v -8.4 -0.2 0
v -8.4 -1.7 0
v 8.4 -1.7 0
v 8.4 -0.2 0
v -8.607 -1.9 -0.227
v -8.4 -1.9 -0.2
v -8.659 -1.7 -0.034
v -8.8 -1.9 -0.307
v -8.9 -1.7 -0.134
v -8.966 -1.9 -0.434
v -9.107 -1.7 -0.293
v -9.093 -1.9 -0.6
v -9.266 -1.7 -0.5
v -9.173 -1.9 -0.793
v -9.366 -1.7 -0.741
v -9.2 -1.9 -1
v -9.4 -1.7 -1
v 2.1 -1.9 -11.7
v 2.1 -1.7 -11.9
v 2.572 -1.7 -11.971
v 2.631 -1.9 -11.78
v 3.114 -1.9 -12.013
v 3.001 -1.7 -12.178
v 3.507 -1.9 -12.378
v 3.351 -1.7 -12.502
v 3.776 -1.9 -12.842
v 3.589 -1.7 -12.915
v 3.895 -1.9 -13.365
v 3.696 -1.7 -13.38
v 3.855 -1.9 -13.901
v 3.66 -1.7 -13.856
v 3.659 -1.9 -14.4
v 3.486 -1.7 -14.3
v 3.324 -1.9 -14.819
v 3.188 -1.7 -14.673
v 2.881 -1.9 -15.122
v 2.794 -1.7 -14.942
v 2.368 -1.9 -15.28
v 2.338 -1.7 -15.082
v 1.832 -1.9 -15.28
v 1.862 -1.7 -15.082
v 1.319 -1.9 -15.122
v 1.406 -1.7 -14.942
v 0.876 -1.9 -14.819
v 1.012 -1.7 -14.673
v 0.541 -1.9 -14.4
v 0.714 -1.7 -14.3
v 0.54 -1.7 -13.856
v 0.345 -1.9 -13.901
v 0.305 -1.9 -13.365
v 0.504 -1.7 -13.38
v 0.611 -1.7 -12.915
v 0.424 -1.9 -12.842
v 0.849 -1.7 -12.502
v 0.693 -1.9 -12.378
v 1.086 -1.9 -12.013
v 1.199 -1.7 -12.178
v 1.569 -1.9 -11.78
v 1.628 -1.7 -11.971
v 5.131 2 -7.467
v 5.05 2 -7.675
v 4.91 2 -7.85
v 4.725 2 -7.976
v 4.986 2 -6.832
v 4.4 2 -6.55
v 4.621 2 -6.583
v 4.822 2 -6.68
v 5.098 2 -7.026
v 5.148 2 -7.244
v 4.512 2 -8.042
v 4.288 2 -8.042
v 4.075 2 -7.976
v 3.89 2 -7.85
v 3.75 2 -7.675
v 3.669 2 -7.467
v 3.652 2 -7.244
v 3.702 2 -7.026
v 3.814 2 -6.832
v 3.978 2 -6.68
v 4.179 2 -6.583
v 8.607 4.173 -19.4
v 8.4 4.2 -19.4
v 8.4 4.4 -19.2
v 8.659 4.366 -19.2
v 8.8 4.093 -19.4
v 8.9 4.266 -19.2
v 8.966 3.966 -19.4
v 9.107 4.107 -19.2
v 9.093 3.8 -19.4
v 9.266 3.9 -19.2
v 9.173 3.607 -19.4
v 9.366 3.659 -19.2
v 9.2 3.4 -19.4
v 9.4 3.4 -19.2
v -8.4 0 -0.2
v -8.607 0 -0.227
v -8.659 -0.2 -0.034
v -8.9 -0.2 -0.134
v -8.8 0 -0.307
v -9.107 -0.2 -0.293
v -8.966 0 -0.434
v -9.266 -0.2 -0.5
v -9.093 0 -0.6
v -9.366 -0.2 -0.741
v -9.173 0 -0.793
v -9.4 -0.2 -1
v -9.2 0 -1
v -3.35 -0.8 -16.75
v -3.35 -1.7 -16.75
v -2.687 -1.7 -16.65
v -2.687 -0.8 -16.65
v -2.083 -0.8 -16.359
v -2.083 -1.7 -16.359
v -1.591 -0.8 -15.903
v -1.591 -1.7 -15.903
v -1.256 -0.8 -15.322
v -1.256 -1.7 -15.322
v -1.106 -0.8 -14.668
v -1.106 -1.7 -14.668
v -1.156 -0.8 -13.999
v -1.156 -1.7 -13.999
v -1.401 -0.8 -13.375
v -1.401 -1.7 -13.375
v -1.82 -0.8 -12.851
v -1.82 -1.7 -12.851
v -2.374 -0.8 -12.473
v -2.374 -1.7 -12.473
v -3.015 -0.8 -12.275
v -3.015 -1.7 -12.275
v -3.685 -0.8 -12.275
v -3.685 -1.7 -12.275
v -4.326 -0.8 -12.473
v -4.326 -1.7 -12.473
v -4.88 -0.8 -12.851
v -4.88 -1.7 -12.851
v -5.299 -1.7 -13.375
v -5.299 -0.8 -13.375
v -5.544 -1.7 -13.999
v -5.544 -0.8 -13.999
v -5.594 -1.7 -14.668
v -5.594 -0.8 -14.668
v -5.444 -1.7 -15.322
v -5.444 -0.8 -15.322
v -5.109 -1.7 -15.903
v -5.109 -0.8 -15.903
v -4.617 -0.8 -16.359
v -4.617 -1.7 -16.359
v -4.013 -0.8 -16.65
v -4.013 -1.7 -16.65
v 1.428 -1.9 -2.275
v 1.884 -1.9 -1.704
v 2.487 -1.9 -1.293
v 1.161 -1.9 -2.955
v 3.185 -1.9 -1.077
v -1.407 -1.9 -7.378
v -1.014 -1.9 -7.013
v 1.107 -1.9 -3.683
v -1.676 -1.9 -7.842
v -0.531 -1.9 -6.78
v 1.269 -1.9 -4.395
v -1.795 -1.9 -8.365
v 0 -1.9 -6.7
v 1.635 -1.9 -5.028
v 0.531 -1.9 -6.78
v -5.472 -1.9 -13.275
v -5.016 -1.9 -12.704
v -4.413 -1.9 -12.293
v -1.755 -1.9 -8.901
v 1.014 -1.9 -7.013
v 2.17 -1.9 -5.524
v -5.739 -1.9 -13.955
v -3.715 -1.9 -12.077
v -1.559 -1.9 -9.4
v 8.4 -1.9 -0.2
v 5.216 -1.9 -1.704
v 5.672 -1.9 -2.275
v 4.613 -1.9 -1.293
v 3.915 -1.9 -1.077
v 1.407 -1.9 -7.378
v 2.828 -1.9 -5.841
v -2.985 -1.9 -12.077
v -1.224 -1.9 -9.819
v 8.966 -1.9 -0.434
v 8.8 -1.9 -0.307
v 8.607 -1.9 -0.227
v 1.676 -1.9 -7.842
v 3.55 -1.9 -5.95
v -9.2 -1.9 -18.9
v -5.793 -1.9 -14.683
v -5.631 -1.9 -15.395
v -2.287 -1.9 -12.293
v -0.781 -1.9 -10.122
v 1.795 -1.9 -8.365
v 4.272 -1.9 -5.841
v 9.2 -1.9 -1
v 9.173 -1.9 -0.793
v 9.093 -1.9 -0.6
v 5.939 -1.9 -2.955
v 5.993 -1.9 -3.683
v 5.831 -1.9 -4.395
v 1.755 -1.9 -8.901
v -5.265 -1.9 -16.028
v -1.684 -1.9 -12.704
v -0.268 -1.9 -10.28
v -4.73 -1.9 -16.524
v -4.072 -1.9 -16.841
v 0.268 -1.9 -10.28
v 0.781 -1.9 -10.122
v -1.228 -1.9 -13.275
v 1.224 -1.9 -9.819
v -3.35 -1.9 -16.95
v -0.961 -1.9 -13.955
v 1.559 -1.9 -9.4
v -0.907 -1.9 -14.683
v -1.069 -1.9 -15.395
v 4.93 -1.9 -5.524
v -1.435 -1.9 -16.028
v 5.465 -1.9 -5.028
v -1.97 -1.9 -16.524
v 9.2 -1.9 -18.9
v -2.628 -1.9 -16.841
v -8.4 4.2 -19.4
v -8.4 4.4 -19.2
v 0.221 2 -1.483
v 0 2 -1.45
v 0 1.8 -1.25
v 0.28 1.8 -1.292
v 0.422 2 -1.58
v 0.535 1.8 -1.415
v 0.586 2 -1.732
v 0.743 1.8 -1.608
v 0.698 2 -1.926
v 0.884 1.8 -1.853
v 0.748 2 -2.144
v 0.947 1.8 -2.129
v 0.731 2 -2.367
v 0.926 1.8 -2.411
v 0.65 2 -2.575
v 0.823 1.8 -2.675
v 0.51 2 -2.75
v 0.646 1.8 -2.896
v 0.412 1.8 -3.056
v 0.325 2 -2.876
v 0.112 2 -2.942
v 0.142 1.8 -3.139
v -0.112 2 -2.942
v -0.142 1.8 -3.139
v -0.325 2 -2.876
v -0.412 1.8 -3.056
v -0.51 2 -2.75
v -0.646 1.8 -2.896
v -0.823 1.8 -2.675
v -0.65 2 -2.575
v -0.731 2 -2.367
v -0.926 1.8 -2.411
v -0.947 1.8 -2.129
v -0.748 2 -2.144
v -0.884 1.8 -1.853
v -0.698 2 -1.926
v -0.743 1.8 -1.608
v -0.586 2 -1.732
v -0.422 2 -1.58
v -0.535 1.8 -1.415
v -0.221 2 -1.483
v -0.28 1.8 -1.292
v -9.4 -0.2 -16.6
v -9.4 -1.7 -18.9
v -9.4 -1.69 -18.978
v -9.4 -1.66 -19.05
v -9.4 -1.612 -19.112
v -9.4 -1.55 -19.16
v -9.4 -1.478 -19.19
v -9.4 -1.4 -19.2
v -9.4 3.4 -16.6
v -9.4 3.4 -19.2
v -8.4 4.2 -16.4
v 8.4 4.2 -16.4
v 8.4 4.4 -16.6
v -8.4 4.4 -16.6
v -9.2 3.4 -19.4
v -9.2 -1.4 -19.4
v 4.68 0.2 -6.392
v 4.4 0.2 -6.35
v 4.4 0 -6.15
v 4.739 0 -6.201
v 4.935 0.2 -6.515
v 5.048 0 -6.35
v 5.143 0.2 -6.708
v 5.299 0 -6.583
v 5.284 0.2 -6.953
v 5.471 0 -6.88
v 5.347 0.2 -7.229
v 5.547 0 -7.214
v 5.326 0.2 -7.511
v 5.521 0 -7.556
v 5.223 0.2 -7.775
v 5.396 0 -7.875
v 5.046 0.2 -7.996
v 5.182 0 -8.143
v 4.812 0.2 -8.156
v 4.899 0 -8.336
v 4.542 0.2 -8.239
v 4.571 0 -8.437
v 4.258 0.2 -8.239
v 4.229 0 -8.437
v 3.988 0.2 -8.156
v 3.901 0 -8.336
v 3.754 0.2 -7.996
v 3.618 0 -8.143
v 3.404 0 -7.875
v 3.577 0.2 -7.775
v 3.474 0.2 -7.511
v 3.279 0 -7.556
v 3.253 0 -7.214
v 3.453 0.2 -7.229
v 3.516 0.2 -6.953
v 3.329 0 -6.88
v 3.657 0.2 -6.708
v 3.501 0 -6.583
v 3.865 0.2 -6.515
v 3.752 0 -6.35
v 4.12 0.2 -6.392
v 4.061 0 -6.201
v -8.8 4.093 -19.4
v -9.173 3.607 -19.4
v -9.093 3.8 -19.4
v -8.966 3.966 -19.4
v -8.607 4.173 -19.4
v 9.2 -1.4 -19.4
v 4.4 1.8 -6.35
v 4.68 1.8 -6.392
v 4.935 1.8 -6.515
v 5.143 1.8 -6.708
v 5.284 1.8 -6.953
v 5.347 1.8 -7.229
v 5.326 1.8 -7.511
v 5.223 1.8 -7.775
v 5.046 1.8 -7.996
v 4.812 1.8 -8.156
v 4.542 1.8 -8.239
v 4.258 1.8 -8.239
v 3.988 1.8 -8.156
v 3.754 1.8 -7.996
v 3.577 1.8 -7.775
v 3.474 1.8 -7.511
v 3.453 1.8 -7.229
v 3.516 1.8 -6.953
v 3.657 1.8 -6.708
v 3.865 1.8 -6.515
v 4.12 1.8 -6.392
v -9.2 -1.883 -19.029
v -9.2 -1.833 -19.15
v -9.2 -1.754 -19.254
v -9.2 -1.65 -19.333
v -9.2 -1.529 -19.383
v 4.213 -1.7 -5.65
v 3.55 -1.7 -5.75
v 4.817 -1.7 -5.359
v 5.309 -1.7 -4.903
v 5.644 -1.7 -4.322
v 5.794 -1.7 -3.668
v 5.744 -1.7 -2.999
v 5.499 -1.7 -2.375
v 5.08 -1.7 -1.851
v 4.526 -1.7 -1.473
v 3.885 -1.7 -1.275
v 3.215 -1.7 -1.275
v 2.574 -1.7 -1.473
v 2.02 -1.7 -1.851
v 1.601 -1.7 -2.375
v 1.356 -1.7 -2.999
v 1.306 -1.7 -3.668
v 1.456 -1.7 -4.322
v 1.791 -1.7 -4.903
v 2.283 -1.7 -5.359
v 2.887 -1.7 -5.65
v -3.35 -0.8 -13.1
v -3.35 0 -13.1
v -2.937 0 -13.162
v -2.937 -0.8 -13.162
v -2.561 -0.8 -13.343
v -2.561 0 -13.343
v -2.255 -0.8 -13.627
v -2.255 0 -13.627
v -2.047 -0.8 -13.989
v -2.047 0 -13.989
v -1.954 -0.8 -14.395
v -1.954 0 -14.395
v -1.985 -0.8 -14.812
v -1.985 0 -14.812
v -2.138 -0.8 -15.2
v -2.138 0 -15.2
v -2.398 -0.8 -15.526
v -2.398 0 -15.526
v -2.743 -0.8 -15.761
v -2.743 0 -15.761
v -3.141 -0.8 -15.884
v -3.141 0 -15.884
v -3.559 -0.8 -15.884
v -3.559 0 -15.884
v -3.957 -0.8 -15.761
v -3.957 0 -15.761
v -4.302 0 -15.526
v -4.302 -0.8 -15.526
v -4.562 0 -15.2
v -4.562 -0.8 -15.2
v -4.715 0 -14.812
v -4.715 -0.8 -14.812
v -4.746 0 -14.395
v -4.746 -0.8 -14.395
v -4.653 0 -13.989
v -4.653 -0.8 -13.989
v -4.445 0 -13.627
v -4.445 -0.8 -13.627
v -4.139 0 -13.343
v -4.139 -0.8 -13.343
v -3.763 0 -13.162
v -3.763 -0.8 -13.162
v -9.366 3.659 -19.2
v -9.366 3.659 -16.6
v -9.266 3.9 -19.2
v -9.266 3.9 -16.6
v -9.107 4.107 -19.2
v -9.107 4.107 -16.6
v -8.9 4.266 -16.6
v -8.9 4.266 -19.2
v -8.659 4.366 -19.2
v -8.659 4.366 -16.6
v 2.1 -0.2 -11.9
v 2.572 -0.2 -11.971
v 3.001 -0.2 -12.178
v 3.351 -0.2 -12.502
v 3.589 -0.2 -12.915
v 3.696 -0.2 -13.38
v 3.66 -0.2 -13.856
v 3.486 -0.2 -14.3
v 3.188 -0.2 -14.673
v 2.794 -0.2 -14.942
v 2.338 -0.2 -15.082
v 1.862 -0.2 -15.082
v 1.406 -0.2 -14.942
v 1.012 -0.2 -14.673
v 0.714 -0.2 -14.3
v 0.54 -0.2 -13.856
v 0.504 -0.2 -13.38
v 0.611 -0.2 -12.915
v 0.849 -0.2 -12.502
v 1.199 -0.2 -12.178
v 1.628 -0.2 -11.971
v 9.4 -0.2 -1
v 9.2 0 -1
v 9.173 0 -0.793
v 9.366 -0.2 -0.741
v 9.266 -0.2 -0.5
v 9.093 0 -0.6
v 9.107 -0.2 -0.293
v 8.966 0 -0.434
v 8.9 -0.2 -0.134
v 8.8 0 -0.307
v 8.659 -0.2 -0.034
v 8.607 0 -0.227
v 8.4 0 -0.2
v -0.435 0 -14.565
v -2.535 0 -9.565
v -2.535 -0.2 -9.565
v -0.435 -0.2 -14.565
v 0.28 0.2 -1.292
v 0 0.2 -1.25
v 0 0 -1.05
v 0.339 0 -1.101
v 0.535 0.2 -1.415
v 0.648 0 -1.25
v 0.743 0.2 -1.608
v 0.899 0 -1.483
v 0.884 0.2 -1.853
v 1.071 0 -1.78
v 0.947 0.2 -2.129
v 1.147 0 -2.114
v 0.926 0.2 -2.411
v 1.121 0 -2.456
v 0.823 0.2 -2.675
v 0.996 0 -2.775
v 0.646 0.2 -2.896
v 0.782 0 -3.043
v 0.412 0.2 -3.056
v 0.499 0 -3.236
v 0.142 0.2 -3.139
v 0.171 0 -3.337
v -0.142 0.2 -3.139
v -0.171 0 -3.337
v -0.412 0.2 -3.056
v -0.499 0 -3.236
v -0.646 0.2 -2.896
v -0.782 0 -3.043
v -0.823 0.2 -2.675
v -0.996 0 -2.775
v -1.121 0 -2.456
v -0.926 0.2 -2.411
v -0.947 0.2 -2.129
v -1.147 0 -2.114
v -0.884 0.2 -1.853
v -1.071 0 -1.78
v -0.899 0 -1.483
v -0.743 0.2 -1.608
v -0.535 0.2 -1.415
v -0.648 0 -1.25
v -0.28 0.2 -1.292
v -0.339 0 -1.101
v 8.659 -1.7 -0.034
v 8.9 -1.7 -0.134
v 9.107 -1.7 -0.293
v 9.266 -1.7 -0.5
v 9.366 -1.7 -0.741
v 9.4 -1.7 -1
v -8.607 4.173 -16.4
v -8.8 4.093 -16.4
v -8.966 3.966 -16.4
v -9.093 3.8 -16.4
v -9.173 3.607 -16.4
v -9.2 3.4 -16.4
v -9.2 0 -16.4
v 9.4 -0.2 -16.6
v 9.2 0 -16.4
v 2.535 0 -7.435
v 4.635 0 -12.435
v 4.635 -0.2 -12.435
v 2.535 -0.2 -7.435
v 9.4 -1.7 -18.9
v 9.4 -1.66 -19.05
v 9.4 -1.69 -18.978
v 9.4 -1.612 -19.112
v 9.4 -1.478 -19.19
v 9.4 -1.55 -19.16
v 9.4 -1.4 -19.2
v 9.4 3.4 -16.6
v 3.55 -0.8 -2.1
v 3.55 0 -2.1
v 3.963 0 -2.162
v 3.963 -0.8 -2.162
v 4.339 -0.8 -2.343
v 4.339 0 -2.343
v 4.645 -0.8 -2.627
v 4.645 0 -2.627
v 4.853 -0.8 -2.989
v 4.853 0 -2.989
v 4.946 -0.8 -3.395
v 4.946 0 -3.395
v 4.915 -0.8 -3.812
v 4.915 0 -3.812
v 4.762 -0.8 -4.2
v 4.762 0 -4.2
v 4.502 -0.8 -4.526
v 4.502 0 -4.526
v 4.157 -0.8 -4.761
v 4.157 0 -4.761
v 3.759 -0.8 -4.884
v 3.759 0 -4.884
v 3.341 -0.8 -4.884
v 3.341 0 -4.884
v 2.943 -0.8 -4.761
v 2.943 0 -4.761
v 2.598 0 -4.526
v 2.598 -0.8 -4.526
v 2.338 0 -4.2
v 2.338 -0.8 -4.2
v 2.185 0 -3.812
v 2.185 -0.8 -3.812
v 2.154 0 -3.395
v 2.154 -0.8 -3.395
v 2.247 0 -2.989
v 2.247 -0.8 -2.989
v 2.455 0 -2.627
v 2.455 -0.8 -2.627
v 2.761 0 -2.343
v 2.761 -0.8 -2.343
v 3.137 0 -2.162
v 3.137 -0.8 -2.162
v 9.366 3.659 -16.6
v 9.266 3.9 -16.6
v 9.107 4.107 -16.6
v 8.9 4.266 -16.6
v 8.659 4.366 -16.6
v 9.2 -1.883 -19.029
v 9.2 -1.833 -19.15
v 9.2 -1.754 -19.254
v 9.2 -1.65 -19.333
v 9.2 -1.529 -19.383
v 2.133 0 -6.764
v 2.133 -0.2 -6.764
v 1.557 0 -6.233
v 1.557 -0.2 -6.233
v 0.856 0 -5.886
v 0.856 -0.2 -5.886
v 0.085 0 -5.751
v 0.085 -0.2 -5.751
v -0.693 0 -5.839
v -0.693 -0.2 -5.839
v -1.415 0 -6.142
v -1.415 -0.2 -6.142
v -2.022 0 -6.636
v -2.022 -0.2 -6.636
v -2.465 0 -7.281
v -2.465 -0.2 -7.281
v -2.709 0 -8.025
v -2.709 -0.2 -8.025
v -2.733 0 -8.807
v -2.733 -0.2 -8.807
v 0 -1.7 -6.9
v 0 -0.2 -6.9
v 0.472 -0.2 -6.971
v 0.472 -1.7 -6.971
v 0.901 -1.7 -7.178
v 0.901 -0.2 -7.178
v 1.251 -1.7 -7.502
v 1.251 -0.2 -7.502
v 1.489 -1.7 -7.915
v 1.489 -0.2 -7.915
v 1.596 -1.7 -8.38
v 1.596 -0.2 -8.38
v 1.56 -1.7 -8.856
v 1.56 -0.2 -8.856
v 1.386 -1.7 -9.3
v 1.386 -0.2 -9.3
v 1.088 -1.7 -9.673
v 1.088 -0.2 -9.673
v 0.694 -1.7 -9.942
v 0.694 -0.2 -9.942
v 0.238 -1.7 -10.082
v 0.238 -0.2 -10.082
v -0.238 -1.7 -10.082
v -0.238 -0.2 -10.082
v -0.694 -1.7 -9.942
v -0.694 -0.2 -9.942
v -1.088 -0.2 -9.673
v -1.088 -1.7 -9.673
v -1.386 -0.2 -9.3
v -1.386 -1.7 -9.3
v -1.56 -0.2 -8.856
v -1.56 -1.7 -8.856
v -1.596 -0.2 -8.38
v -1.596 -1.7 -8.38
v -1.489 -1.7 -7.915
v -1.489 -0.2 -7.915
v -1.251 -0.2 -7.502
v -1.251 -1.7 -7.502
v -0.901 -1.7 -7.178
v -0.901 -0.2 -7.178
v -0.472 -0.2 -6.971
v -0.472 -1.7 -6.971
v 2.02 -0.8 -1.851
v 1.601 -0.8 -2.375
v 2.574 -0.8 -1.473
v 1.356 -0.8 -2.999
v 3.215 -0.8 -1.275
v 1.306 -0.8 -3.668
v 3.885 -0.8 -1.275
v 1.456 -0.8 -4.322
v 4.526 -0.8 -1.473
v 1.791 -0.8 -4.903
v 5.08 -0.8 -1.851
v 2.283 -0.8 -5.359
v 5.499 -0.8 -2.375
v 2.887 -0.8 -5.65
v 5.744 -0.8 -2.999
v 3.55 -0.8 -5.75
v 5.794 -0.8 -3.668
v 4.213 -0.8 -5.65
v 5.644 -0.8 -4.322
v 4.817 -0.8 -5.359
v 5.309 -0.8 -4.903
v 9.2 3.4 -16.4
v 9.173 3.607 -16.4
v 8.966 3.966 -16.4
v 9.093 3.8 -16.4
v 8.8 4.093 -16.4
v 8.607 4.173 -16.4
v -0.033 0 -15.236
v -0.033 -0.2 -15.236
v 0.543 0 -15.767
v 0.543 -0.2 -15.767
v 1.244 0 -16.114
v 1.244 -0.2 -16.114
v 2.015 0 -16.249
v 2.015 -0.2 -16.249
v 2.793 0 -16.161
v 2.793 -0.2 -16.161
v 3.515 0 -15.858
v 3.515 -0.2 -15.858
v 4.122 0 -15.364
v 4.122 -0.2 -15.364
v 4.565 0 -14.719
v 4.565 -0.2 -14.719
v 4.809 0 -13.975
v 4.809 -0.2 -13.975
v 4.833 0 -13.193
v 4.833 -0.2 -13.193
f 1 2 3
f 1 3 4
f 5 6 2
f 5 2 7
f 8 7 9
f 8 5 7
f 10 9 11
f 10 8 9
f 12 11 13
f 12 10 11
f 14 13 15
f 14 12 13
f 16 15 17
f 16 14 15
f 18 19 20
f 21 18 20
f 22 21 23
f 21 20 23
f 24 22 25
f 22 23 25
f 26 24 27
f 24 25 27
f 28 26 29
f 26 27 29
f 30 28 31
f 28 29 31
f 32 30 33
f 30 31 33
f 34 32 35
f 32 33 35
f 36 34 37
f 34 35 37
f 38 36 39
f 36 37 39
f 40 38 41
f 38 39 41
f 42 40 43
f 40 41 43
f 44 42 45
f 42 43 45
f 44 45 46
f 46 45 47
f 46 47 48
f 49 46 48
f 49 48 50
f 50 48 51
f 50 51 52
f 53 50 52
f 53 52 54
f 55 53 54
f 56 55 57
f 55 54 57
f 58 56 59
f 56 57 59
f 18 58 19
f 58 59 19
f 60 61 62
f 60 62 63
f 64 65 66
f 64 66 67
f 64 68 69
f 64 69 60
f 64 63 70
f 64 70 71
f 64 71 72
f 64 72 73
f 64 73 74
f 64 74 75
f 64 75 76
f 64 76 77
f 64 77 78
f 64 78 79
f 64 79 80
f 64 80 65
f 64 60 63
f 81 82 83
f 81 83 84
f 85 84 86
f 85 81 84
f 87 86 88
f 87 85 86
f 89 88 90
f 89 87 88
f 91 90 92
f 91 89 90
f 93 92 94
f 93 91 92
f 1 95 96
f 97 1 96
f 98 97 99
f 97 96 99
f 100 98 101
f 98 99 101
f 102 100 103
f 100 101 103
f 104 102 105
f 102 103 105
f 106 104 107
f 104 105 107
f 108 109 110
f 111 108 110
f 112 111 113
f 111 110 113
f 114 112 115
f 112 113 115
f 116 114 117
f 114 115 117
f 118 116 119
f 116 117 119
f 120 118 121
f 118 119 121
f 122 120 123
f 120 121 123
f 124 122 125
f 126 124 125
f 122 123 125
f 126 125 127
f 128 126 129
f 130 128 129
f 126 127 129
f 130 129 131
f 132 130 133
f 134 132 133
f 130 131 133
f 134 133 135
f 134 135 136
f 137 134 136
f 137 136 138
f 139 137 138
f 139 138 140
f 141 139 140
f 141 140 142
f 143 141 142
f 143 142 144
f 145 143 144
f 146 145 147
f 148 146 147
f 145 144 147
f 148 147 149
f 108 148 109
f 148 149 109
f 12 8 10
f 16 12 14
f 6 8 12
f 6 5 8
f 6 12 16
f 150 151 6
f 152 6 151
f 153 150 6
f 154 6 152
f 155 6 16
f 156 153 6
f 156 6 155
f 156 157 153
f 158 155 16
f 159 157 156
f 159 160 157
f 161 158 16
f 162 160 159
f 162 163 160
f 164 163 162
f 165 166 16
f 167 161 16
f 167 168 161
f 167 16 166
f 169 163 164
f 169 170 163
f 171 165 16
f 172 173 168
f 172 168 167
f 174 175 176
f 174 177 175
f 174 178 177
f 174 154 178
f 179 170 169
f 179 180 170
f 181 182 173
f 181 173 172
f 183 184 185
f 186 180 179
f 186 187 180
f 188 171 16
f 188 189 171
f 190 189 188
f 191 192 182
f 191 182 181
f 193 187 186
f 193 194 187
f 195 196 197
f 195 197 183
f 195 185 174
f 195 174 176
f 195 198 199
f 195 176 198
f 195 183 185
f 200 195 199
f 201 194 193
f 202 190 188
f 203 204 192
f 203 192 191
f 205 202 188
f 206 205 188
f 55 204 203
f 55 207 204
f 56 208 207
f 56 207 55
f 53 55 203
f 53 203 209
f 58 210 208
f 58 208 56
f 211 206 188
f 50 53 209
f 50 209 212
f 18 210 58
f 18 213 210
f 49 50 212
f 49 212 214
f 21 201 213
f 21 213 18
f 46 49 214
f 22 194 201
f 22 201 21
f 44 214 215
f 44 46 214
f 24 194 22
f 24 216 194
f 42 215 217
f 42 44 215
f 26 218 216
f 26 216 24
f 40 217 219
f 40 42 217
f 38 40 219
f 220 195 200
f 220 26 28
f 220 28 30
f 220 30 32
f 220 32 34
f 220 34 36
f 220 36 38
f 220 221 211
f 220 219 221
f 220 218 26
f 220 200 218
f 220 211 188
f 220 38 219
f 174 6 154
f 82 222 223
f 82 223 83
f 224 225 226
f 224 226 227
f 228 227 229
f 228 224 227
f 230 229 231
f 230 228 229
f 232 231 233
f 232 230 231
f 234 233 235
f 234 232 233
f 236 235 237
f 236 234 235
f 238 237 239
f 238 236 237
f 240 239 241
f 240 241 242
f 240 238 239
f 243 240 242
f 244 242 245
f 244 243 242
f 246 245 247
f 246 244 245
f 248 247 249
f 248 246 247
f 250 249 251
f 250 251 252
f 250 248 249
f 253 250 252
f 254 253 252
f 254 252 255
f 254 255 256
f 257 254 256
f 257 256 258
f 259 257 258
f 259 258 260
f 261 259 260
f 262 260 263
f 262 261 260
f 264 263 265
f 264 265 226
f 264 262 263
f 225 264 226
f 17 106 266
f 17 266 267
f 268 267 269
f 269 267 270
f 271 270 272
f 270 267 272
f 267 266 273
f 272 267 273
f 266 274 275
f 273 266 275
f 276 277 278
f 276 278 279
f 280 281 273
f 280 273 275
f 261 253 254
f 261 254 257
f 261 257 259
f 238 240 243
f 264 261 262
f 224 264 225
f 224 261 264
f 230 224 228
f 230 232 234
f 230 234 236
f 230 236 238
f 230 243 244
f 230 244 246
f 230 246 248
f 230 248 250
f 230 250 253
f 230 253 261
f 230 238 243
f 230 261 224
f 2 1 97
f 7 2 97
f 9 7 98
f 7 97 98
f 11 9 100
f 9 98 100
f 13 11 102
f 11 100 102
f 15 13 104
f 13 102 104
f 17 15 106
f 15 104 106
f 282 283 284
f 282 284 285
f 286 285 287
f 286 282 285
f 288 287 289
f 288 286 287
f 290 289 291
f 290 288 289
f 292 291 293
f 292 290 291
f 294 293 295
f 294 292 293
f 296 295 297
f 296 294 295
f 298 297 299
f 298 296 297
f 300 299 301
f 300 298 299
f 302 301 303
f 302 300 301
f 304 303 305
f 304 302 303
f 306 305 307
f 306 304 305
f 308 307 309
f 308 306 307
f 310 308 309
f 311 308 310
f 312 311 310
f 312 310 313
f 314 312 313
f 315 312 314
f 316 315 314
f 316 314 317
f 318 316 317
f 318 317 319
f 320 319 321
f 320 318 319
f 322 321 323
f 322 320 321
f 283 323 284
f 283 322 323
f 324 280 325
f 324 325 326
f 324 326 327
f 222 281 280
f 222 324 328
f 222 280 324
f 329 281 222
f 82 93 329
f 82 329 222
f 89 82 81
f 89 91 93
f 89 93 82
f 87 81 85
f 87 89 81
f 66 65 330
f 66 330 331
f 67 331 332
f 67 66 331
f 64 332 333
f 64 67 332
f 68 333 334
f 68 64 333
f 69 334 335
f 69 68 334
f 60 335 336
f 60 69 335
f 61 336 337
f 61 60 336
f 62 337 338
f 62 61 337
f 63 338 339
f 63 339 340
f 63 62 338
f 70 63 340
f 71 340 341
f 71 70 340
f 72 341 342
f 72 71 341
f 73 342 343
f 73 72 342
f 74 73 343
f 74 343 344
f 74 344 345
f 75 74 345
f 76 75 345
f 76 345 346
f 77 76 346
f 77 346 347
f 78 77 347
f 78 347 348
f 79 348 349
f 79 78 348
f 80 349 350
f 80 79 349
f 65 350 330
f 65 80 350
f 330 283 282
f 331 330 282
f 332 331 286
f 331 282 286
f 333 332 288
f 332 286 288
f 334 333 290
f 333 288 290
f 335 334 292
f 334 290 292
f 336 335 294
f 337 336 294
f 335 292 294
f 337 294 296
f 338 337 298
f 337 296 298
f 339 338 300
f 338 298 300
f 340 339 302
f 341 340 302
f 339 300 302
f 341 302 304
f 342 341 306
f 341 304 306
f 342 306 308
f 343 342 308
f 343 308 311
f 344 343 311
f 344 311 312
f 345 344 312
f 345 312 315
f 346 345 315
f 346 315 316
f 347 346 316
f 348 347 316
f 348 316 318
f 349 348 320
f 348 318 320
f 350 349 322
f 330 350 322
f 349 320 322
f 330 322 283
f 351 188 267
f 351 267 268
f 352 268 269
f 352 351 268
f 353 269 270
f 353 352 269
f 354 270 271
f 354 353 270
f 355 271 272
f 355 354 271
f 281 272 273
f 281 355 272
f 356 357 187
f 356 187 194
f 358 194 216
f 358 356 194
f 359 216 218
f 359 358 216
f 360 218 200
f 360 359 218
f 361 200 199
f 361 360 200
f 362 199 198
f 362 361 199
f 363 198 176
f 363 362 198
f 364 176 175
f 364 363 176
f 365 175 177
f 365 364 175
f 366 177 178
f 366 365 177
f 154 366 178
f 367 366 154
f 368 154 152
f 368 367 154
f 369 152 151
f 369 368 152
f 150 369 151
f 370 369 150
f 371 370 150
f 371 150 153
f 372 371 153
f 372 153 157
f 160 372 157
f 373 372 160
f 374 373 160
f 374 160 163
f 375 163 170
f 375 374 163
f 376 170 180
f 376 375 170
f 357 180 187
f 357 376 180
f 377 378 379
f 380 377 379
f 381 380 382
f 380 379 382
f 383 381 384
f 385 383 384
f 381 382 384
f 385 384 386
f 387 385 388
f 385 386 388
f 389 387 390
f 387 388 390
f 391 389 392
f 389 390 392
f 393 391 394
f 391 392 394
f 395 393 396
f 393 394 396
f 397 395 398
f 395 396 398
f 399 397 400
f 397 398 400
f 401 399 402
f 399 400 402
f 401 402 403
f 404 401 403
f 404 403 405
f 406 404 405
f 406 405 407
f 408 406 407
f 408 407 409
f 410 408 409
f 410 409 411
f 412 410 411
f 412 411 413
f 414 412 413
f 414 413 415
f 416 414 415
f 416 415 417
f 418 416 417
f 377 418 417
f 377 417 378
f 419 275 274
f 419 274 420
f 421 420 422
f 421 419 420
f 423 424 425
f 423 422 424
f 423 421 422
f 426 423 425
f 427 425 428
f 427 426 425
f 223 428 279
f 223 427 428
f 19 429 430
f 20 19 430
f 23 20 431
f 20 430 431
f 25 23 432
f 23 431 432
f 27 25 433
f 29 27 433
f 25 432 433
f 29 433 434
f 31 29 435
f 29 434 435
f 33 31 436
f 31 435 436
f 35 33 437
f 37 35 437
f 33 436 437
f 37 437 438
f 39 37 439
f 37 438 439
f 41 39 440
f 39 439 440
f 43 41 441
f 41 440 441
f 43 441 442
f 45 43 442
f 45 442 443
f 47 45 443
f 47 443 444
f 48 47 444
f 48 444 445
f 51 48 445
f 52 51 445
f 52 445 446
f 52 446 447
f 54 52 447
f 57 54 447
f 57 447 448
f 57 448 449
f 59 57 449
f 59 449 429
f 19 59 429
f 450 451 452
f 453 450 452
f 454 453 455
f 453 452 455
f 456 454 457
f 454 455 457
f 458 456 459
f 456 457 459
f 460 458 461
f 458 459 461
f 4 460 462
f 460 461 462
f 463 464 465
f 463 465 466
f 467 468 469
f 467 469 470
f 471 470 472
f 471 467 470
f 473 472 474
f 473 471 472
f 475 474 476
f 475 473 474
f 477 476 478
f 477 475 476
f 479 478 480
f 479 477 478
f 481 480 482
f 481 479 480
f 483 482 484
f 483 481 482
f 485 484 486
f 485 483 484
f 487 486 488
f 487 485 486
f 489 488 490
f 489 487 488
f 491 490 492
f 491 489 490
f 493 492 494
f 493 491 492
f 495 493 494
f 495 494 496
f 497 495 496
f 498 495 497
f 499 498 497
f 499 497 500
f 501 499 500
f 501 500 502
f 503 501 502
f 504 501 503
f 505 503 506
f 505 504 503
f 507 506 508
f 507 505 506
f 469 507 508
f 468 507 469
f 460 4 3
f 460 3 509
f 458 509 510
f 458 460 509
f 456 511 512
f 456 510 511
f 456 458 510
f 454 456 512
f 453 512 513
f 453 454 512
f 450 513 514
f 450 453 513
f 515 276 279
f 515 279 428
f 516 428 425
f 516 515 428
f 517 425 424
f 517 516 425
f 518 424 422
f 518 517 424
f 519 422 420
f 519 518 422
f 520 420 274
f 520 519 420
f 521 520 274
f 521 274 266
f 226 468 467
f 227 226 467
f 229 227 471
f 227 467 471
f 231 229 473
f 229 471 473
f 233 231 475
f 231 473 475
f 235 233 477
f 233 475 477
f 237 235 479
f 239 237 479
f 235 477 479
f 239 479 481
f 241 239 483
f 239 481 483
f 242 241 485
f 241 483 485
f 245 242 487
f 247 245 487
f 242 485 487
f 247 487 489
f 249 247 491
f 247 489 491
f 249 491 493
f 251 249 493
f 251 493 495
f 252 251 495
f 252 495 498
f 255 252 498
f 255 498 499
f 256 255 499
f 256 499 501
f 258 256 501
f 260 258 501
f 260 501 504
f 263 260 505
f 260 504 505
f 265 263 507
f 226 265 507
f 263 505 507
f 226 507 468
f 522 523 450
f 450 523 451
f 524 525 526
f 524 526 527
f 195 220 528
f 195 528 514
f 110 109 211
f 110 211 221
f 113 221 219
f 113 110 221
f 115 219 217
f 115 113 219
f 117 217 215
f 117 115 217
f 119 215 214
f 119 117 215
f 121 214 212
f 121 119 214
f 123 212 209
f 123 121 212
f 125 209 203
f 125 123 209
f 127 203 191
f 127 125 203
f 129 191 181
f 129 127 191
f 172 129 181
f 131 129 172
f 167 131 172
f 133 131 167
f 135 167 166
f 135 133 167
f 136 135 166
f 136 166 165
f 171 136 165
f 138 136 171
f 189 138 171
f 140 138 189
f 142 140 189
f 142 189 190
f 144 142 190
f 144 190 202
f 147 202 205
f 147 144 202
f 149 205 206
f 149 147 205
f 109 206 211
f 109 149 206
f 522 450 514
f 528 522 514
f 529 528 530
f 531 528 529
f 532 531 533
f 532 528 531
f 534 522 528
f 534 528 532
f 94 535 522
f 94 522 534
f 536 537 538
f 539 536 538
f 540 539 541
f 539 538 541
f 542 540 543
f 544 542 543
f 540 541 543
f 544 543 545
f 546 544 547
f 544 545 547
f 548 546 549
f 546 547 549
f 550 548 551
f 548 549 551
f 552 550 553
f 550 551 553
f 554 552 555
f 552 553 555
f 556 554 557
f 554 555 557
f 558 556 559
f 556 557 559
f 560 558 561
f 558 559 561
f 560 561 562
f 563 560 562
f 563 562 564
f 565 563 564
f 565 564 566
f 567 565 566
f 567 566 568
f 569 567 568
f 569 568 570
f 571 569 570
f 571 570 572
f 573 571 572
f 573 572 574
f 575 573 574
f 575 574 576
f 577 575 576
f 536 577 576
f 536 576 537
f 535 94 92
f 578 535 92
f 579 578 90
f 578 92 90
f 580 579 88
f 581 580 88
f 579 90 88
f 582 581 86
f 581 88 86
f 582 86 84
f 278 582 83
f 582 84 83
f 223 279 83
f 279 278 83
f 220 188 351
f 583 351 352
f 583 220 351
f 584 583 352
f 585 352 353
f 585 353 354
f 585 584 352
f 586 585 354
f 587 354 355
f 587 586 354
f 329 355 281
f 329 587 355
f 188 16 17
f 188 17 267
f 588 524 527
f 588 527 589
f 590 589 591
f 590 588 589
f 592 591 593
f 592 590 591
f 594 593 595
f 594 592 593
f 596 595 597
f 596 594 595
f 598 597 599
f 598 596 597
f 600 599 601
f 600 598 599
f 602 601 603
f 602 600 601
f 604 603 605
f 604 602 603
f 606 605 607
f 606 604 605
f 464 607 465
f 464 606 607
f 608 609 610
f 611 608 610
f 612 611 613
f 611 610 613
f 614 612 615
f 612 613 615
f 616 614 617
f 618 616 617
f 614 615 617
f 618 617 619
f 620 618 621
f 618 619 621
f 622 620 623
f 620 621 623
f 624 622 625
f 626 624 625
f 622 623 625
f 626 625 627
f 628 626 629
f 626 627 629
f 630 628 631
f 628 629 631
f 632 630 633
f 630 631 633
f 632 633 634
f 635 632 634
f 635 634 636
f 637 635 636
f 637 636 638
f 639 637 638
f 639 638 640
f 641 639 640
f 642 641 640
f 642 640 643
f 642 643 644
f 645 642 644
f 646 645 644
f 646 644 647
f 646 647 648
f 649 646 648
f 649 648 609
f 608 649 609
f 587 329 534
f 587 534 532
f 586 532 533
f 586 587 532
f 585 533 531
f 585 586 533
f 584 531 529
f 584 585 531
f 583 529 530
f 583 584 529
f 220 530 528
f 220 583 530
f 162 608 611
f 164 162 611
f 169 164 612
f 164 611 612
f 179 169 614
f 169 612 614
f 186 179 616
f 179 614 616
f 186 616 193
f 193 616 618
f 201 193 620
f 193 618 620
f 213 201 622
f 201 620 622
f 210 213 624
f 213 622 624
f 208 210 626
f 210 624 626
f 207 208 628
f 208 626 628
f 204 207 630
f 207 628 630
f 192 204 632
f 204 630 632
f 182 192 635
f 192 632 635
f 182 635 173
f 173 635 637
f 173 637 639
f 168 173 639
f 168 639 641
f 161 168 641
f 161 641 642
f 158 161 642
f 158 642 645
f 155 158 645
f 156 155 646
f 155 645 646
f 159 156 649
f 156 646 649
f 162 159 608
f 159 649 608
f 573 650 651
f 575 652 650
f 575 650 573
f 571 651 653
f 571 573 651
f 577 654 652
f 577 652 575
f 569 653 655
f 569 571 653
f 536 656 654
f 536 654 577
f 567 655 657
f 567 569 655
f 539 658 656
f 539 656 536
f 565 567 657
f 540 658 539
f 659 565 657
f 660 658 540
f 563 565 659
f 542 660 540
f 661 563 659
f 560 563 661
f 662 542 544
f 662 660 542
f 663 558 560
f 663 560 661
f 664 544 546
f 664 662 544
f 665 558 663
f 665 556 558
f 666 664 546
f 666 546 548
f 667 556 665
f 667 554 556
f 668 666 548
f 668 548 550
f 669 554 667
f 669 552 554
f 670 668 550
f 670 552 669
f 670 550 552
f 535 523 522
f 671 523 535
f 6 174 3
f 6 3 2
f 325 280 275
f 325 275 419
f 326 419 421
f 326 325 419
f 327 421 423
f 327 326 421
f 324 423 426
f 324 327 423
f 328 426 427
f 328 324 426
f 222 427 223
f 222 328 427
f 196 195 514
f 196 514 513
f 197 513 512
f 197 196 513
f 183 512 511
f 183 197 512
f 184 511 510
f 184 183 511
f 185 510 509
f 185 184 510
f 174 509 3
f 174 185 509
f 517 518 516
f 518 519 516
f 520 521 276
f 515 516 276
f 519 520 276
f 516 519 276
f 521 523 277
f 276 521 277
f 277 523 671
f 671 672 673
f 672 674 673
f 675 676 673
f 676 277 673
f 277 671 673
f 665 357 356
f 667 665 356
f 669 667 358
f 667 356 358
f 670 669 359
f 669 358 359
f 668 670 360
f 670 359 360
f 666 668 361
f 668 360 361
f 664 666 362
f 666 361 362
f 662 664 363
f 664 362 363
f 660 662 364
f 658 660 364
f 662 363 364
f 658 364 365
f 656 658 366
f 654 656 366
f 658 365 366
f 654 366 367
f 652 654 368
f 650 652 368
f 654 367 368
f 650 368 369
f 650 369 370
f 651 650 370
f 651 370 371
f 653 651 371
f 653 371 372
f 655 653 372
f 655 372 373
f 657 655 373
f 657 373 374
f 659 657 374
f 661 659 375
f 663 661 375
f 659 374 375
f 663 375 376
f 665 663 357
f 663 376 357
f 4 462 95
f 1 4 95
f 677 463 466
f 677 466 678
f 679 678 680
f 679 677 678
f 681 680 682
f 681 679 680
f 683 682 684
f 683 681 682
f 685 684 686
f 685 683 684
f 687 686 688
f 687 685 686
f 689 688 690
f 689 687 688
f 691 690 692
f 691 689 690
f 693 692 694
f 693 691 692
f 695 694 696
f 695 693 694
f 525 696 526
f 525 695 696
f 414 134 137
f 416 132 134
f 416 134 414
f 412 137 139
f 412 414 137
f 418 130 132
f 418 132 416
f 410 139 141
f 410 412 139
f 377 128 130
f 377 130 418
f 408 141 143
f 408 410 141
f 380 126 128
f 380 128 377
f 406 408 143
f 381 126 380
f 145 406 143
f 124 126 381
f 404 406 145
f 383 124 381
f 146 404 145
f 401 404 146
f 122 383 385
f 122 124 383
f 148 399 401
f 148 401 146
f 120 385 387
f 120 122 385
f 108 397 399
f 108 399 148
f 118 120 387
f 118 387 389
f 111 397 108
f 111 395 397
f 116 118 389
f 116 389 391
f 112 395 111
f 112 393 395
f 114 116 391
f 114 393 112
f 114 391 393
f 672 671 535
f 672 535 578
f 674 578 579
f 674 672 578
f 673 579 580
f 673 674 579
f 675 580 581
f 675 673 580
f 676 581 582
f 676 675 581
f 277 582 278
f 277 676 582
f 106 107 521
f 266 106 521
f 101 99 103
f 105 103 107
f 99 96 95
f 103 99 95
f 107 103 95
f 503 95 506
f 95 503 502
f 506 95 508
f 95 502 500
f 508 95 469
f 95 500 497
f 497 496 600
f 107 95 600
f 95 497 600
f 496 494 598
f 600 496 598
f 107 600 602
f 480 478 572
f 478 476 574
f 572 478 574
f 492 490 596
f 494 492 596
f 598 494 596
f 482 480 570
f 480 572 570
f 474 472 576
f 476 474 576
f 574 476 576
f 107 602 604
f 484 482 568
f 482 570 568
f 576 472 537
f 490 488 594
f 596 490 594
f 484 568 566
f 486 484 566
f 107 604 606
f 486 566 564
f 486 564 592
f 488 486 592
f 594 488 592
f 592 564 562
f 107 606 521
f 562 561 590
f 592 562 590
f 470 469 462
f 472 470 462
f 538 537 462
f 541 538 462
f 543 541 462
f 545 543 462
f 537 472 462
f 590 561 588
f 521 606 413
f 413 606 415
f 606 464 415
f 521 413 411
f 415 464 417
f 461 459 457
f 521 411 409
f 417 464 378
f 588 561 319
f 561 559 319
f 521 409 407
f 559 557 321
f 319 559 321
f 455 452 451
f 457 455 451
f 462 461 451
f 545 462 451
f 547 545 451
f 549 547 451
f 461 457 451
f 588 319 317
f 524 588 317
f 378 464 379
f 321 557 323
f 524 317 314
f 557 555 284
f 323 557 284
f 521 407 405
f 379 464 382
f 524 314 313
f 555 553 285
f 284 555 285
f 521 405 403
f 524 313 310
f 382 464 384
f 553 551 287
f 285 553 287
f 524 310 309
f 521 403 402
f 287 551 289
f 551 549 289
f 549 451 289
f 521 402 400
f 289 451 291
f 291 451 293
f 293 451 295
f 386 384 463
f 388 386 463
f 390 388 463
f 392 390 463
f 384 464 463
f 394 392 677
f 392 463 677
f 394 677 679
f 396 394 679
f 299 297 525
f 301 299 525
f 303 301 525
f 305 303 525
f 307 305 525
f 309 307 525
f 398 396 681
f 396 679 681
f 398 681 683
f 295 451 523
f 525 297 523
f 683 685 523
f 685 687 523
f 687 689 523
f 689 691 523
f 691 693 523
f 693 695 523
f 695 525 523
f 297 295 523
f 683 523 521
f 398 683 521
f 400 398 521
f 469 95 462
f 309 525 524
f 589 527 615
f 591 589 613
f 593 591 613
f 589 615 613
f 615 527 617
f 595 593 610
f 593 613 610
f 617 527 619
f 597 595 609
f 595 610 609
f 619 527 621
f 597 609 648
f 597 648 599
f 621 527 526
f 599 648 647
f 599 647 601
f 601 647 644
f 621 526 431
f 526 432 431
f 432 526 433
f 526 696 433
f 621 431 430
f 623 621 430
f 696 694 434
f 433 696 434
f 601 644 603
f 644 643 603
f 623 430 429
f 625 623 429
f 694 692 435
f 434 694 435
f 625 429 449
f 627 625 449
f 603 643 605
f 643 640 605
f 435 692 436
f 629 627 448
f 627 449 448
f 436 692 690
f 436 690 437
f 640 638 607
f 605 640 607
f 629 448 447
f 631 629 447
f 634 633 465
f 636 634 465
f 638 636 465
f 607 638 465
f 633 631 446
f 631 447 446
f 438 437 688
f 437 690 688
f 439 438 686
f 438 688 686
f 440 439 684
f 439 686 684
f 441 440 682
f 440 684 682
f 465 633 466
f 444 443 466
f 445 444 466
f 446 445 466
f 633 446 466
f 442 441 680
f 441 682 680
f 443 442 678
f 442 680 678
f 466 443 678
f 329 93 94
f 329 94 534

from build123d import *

# Parameters (mm, degrees)
SKETCH1_W           = 19.4
SKETCH1_H           = 1.9
SKETCH1_W_2         = 3
SKETCH1_H_2         = 4.4
BOSS_EXTRUDE1_DEPTH = 9.4
SKETCH2_R           = 1.6
SKETCH2_R_2         = 1.4
CUT_EXTRUDE1_DEPTH  = 23.001818107
CUT_EXTRUDE2_DEPTH  = 0.2
SKETCH4_R           = 2.25
CUT_EXTRUDE3_DEPTH  = 1.1
FILLET1_R           = 1
SKETCH5_R           = 0.95
BOSS_EXTRUDE2_DEPTH = 2
FILLET4_R           = 0.5
CHAMFER1_SIZE       = 0.2


with BuildPart() as part:
    # Sketch1 → Boss-Extrude1 (new, symmetric)
    with BuildSketch(Plane(origin=(0, 0, 0), x_dir=(0, 0, -1), z_dir=(1, 0, 0))):
        with Locations((9.7, -0.95)):
            Rectangle(SKETCH1_W, SKETCH1_H)
        with Locations((17.9, 2.2)):
            Rectangle(SKETCH1_W_2, SKETCH1_H_2)
    extrude(amount=BOSS_EXTRUDE1_DEPTH, both=True)

    # Sketch2 → Cut-Extrude1 (cut, through all)
    with BuildSketch(Plane(origin=(0, 0, 0), x_dir=(1, 0, 0), z_dir=(0, 1, 0))):
        with Locations(Location((0, 8.5, 0), (0, 0, 270))):
            Circle(SKETCH2_R)
        with Locations(Location((2.1, 13.5, 0), (0, 0, 270))):
            Circle(SKETCH2_R)
        with Locations(Location((3.55, 3.5, 0), (0, 0, 270))):
            Circle(SKETCH2_R_2)
        with Locations(Location((-3.35, 14.5, 0), (0, 0, 270))):
            Circle(SKETCH2_R_2)
    extrude(amount=-CUT_EXTRUDE1_DEPTH, mode=Mode.SUBTRACT)

    # Sketch3 → Cut-Extrude2 (cut)
    with BuildSketch(Plane(origin=(0, 0, 0), x_dir=(1, 0, 0), z_dir=(0, 1, 0))):
        with BuildLine():
            Line((-2.53545079, 9.564889332), (-0.43545079, 14.564889332))
            ThreePointArc((-0.43545079, 14.564889332), (3.164889332, 16.03545079), (4.63545079, 12.435110668))
            Line((4.63545079, 12.435110668), (2.53545079, 7.435110668))
            ThreePointArc((2.53545079, 7.435110668), (-1.064889332, 5.96454921), (-2.53545079, 9.564889332))
        make_face()
    extrude(amount=-CUT_EXTRUDE2_DEPTH, mode=Mode.SUBTRACT)

    # Sketch4 → Cut-Extrude3 (cut)
    with BuildSketch(Plane.XZ.offset(1.9)):
        with Locations(Location((-3.35, -14.5, 0), (0, 0, 270))):
            Circle(SKETCH4_R)
        with Locations(Location((3.55, -3.5, 0), (0, 0, 270))):
            Circle(SKETCH4_R)
    extrude(amount=-CUT_EXTRUDE3_DEPTH, mode=Mode.SUBTRACT)

    # Fillet1
    fillet1_edges = [part.edges().sort_by_distance(p)[0] for p in [
        (9.4, 4.4, -17.9),
        (9.4, -0.95, 0),
        (-9.4, -0.95, 0),
        (-9.4, 4.4, -17.9),
    ]]
    fillet(fillet1_edges, radius=FILLET1_R)

    # Sketch5 → Boss-Extrude2 (add)
    with BuildSketch(Plane(origin=(0, 0, 0), x_dir=(1, 0, 0), z_dir=(0, 1, 0))):
        with Locations(Location((0, 2.2, 0), (0, 0, 270))):
            Circle(SKETCH5_R)
        with Locations(Location((4.4, 7.3, 0), (0, 0, 270))):
            Circle(SKETCH5_R)
    extrude(amount=BOSS_EXTRUDE2_DEPTH)

    # Fillet4
    fillet4_edges = [part.edges().sort_by_distance(p)[0] for p in [
        (0, -1.9, -19.4),
    ]]
    fillet(fillet4_edges, radius=FILLET4_R)

    # Chamfer1
    chamfer1_edges = [part.edges().sort_by_distance(p)[0] for p in [
        (4.4, 0, -8.25),
        (4.4, 2, -8.25),
        (-9.4, -1.753553391, -19.253553391),
        (9.4, -1.753553391, -19.253553391),
        (9.4, 1.7, -16.4),
        (2.1, -1.9, -15.1),
        (0, -1.9, -10.1),
        (-3.35, -1.9, -12.25),
        (3.55, -1.9, -1.25),
        (0, 4.4, -16.4),
        (0, 4.4, -19.4),
        (9.107106781, 4.107106781, -16.4),
        (-9.107106781, 4.107106781, -16.4),
        (-9.4, 1, -19.4),
        (-9.4, -1.9, -9.95),
        (-9.4, 0, -8.7),
        (9.4, 1, -19.4),
        (9.107106781, 4.107106781, -19.4),
        (-9.107106781, 4.107106781, -19.4),
        (9.4, 0, -8.7),
        (9.4, -1.9, -9.95),
        (0, -1.9, 0),
        (0, 0, 0),
        (9.107106781, -1.9, -0.292893219),
        (-9.107106781, -1.9, -0.292893219),
        (9.107106781, 0, -0.292893219),
        (-9.107106781, 0, -0.292893219),
        (-9.4, 1.7, -16.4),
        (0, 0, -3.15),
        (0, 2, -3.15),
    ]]
    chamfer(chamfer1_edges, length=CHAMFER1_SIZE)


solid = part.part
